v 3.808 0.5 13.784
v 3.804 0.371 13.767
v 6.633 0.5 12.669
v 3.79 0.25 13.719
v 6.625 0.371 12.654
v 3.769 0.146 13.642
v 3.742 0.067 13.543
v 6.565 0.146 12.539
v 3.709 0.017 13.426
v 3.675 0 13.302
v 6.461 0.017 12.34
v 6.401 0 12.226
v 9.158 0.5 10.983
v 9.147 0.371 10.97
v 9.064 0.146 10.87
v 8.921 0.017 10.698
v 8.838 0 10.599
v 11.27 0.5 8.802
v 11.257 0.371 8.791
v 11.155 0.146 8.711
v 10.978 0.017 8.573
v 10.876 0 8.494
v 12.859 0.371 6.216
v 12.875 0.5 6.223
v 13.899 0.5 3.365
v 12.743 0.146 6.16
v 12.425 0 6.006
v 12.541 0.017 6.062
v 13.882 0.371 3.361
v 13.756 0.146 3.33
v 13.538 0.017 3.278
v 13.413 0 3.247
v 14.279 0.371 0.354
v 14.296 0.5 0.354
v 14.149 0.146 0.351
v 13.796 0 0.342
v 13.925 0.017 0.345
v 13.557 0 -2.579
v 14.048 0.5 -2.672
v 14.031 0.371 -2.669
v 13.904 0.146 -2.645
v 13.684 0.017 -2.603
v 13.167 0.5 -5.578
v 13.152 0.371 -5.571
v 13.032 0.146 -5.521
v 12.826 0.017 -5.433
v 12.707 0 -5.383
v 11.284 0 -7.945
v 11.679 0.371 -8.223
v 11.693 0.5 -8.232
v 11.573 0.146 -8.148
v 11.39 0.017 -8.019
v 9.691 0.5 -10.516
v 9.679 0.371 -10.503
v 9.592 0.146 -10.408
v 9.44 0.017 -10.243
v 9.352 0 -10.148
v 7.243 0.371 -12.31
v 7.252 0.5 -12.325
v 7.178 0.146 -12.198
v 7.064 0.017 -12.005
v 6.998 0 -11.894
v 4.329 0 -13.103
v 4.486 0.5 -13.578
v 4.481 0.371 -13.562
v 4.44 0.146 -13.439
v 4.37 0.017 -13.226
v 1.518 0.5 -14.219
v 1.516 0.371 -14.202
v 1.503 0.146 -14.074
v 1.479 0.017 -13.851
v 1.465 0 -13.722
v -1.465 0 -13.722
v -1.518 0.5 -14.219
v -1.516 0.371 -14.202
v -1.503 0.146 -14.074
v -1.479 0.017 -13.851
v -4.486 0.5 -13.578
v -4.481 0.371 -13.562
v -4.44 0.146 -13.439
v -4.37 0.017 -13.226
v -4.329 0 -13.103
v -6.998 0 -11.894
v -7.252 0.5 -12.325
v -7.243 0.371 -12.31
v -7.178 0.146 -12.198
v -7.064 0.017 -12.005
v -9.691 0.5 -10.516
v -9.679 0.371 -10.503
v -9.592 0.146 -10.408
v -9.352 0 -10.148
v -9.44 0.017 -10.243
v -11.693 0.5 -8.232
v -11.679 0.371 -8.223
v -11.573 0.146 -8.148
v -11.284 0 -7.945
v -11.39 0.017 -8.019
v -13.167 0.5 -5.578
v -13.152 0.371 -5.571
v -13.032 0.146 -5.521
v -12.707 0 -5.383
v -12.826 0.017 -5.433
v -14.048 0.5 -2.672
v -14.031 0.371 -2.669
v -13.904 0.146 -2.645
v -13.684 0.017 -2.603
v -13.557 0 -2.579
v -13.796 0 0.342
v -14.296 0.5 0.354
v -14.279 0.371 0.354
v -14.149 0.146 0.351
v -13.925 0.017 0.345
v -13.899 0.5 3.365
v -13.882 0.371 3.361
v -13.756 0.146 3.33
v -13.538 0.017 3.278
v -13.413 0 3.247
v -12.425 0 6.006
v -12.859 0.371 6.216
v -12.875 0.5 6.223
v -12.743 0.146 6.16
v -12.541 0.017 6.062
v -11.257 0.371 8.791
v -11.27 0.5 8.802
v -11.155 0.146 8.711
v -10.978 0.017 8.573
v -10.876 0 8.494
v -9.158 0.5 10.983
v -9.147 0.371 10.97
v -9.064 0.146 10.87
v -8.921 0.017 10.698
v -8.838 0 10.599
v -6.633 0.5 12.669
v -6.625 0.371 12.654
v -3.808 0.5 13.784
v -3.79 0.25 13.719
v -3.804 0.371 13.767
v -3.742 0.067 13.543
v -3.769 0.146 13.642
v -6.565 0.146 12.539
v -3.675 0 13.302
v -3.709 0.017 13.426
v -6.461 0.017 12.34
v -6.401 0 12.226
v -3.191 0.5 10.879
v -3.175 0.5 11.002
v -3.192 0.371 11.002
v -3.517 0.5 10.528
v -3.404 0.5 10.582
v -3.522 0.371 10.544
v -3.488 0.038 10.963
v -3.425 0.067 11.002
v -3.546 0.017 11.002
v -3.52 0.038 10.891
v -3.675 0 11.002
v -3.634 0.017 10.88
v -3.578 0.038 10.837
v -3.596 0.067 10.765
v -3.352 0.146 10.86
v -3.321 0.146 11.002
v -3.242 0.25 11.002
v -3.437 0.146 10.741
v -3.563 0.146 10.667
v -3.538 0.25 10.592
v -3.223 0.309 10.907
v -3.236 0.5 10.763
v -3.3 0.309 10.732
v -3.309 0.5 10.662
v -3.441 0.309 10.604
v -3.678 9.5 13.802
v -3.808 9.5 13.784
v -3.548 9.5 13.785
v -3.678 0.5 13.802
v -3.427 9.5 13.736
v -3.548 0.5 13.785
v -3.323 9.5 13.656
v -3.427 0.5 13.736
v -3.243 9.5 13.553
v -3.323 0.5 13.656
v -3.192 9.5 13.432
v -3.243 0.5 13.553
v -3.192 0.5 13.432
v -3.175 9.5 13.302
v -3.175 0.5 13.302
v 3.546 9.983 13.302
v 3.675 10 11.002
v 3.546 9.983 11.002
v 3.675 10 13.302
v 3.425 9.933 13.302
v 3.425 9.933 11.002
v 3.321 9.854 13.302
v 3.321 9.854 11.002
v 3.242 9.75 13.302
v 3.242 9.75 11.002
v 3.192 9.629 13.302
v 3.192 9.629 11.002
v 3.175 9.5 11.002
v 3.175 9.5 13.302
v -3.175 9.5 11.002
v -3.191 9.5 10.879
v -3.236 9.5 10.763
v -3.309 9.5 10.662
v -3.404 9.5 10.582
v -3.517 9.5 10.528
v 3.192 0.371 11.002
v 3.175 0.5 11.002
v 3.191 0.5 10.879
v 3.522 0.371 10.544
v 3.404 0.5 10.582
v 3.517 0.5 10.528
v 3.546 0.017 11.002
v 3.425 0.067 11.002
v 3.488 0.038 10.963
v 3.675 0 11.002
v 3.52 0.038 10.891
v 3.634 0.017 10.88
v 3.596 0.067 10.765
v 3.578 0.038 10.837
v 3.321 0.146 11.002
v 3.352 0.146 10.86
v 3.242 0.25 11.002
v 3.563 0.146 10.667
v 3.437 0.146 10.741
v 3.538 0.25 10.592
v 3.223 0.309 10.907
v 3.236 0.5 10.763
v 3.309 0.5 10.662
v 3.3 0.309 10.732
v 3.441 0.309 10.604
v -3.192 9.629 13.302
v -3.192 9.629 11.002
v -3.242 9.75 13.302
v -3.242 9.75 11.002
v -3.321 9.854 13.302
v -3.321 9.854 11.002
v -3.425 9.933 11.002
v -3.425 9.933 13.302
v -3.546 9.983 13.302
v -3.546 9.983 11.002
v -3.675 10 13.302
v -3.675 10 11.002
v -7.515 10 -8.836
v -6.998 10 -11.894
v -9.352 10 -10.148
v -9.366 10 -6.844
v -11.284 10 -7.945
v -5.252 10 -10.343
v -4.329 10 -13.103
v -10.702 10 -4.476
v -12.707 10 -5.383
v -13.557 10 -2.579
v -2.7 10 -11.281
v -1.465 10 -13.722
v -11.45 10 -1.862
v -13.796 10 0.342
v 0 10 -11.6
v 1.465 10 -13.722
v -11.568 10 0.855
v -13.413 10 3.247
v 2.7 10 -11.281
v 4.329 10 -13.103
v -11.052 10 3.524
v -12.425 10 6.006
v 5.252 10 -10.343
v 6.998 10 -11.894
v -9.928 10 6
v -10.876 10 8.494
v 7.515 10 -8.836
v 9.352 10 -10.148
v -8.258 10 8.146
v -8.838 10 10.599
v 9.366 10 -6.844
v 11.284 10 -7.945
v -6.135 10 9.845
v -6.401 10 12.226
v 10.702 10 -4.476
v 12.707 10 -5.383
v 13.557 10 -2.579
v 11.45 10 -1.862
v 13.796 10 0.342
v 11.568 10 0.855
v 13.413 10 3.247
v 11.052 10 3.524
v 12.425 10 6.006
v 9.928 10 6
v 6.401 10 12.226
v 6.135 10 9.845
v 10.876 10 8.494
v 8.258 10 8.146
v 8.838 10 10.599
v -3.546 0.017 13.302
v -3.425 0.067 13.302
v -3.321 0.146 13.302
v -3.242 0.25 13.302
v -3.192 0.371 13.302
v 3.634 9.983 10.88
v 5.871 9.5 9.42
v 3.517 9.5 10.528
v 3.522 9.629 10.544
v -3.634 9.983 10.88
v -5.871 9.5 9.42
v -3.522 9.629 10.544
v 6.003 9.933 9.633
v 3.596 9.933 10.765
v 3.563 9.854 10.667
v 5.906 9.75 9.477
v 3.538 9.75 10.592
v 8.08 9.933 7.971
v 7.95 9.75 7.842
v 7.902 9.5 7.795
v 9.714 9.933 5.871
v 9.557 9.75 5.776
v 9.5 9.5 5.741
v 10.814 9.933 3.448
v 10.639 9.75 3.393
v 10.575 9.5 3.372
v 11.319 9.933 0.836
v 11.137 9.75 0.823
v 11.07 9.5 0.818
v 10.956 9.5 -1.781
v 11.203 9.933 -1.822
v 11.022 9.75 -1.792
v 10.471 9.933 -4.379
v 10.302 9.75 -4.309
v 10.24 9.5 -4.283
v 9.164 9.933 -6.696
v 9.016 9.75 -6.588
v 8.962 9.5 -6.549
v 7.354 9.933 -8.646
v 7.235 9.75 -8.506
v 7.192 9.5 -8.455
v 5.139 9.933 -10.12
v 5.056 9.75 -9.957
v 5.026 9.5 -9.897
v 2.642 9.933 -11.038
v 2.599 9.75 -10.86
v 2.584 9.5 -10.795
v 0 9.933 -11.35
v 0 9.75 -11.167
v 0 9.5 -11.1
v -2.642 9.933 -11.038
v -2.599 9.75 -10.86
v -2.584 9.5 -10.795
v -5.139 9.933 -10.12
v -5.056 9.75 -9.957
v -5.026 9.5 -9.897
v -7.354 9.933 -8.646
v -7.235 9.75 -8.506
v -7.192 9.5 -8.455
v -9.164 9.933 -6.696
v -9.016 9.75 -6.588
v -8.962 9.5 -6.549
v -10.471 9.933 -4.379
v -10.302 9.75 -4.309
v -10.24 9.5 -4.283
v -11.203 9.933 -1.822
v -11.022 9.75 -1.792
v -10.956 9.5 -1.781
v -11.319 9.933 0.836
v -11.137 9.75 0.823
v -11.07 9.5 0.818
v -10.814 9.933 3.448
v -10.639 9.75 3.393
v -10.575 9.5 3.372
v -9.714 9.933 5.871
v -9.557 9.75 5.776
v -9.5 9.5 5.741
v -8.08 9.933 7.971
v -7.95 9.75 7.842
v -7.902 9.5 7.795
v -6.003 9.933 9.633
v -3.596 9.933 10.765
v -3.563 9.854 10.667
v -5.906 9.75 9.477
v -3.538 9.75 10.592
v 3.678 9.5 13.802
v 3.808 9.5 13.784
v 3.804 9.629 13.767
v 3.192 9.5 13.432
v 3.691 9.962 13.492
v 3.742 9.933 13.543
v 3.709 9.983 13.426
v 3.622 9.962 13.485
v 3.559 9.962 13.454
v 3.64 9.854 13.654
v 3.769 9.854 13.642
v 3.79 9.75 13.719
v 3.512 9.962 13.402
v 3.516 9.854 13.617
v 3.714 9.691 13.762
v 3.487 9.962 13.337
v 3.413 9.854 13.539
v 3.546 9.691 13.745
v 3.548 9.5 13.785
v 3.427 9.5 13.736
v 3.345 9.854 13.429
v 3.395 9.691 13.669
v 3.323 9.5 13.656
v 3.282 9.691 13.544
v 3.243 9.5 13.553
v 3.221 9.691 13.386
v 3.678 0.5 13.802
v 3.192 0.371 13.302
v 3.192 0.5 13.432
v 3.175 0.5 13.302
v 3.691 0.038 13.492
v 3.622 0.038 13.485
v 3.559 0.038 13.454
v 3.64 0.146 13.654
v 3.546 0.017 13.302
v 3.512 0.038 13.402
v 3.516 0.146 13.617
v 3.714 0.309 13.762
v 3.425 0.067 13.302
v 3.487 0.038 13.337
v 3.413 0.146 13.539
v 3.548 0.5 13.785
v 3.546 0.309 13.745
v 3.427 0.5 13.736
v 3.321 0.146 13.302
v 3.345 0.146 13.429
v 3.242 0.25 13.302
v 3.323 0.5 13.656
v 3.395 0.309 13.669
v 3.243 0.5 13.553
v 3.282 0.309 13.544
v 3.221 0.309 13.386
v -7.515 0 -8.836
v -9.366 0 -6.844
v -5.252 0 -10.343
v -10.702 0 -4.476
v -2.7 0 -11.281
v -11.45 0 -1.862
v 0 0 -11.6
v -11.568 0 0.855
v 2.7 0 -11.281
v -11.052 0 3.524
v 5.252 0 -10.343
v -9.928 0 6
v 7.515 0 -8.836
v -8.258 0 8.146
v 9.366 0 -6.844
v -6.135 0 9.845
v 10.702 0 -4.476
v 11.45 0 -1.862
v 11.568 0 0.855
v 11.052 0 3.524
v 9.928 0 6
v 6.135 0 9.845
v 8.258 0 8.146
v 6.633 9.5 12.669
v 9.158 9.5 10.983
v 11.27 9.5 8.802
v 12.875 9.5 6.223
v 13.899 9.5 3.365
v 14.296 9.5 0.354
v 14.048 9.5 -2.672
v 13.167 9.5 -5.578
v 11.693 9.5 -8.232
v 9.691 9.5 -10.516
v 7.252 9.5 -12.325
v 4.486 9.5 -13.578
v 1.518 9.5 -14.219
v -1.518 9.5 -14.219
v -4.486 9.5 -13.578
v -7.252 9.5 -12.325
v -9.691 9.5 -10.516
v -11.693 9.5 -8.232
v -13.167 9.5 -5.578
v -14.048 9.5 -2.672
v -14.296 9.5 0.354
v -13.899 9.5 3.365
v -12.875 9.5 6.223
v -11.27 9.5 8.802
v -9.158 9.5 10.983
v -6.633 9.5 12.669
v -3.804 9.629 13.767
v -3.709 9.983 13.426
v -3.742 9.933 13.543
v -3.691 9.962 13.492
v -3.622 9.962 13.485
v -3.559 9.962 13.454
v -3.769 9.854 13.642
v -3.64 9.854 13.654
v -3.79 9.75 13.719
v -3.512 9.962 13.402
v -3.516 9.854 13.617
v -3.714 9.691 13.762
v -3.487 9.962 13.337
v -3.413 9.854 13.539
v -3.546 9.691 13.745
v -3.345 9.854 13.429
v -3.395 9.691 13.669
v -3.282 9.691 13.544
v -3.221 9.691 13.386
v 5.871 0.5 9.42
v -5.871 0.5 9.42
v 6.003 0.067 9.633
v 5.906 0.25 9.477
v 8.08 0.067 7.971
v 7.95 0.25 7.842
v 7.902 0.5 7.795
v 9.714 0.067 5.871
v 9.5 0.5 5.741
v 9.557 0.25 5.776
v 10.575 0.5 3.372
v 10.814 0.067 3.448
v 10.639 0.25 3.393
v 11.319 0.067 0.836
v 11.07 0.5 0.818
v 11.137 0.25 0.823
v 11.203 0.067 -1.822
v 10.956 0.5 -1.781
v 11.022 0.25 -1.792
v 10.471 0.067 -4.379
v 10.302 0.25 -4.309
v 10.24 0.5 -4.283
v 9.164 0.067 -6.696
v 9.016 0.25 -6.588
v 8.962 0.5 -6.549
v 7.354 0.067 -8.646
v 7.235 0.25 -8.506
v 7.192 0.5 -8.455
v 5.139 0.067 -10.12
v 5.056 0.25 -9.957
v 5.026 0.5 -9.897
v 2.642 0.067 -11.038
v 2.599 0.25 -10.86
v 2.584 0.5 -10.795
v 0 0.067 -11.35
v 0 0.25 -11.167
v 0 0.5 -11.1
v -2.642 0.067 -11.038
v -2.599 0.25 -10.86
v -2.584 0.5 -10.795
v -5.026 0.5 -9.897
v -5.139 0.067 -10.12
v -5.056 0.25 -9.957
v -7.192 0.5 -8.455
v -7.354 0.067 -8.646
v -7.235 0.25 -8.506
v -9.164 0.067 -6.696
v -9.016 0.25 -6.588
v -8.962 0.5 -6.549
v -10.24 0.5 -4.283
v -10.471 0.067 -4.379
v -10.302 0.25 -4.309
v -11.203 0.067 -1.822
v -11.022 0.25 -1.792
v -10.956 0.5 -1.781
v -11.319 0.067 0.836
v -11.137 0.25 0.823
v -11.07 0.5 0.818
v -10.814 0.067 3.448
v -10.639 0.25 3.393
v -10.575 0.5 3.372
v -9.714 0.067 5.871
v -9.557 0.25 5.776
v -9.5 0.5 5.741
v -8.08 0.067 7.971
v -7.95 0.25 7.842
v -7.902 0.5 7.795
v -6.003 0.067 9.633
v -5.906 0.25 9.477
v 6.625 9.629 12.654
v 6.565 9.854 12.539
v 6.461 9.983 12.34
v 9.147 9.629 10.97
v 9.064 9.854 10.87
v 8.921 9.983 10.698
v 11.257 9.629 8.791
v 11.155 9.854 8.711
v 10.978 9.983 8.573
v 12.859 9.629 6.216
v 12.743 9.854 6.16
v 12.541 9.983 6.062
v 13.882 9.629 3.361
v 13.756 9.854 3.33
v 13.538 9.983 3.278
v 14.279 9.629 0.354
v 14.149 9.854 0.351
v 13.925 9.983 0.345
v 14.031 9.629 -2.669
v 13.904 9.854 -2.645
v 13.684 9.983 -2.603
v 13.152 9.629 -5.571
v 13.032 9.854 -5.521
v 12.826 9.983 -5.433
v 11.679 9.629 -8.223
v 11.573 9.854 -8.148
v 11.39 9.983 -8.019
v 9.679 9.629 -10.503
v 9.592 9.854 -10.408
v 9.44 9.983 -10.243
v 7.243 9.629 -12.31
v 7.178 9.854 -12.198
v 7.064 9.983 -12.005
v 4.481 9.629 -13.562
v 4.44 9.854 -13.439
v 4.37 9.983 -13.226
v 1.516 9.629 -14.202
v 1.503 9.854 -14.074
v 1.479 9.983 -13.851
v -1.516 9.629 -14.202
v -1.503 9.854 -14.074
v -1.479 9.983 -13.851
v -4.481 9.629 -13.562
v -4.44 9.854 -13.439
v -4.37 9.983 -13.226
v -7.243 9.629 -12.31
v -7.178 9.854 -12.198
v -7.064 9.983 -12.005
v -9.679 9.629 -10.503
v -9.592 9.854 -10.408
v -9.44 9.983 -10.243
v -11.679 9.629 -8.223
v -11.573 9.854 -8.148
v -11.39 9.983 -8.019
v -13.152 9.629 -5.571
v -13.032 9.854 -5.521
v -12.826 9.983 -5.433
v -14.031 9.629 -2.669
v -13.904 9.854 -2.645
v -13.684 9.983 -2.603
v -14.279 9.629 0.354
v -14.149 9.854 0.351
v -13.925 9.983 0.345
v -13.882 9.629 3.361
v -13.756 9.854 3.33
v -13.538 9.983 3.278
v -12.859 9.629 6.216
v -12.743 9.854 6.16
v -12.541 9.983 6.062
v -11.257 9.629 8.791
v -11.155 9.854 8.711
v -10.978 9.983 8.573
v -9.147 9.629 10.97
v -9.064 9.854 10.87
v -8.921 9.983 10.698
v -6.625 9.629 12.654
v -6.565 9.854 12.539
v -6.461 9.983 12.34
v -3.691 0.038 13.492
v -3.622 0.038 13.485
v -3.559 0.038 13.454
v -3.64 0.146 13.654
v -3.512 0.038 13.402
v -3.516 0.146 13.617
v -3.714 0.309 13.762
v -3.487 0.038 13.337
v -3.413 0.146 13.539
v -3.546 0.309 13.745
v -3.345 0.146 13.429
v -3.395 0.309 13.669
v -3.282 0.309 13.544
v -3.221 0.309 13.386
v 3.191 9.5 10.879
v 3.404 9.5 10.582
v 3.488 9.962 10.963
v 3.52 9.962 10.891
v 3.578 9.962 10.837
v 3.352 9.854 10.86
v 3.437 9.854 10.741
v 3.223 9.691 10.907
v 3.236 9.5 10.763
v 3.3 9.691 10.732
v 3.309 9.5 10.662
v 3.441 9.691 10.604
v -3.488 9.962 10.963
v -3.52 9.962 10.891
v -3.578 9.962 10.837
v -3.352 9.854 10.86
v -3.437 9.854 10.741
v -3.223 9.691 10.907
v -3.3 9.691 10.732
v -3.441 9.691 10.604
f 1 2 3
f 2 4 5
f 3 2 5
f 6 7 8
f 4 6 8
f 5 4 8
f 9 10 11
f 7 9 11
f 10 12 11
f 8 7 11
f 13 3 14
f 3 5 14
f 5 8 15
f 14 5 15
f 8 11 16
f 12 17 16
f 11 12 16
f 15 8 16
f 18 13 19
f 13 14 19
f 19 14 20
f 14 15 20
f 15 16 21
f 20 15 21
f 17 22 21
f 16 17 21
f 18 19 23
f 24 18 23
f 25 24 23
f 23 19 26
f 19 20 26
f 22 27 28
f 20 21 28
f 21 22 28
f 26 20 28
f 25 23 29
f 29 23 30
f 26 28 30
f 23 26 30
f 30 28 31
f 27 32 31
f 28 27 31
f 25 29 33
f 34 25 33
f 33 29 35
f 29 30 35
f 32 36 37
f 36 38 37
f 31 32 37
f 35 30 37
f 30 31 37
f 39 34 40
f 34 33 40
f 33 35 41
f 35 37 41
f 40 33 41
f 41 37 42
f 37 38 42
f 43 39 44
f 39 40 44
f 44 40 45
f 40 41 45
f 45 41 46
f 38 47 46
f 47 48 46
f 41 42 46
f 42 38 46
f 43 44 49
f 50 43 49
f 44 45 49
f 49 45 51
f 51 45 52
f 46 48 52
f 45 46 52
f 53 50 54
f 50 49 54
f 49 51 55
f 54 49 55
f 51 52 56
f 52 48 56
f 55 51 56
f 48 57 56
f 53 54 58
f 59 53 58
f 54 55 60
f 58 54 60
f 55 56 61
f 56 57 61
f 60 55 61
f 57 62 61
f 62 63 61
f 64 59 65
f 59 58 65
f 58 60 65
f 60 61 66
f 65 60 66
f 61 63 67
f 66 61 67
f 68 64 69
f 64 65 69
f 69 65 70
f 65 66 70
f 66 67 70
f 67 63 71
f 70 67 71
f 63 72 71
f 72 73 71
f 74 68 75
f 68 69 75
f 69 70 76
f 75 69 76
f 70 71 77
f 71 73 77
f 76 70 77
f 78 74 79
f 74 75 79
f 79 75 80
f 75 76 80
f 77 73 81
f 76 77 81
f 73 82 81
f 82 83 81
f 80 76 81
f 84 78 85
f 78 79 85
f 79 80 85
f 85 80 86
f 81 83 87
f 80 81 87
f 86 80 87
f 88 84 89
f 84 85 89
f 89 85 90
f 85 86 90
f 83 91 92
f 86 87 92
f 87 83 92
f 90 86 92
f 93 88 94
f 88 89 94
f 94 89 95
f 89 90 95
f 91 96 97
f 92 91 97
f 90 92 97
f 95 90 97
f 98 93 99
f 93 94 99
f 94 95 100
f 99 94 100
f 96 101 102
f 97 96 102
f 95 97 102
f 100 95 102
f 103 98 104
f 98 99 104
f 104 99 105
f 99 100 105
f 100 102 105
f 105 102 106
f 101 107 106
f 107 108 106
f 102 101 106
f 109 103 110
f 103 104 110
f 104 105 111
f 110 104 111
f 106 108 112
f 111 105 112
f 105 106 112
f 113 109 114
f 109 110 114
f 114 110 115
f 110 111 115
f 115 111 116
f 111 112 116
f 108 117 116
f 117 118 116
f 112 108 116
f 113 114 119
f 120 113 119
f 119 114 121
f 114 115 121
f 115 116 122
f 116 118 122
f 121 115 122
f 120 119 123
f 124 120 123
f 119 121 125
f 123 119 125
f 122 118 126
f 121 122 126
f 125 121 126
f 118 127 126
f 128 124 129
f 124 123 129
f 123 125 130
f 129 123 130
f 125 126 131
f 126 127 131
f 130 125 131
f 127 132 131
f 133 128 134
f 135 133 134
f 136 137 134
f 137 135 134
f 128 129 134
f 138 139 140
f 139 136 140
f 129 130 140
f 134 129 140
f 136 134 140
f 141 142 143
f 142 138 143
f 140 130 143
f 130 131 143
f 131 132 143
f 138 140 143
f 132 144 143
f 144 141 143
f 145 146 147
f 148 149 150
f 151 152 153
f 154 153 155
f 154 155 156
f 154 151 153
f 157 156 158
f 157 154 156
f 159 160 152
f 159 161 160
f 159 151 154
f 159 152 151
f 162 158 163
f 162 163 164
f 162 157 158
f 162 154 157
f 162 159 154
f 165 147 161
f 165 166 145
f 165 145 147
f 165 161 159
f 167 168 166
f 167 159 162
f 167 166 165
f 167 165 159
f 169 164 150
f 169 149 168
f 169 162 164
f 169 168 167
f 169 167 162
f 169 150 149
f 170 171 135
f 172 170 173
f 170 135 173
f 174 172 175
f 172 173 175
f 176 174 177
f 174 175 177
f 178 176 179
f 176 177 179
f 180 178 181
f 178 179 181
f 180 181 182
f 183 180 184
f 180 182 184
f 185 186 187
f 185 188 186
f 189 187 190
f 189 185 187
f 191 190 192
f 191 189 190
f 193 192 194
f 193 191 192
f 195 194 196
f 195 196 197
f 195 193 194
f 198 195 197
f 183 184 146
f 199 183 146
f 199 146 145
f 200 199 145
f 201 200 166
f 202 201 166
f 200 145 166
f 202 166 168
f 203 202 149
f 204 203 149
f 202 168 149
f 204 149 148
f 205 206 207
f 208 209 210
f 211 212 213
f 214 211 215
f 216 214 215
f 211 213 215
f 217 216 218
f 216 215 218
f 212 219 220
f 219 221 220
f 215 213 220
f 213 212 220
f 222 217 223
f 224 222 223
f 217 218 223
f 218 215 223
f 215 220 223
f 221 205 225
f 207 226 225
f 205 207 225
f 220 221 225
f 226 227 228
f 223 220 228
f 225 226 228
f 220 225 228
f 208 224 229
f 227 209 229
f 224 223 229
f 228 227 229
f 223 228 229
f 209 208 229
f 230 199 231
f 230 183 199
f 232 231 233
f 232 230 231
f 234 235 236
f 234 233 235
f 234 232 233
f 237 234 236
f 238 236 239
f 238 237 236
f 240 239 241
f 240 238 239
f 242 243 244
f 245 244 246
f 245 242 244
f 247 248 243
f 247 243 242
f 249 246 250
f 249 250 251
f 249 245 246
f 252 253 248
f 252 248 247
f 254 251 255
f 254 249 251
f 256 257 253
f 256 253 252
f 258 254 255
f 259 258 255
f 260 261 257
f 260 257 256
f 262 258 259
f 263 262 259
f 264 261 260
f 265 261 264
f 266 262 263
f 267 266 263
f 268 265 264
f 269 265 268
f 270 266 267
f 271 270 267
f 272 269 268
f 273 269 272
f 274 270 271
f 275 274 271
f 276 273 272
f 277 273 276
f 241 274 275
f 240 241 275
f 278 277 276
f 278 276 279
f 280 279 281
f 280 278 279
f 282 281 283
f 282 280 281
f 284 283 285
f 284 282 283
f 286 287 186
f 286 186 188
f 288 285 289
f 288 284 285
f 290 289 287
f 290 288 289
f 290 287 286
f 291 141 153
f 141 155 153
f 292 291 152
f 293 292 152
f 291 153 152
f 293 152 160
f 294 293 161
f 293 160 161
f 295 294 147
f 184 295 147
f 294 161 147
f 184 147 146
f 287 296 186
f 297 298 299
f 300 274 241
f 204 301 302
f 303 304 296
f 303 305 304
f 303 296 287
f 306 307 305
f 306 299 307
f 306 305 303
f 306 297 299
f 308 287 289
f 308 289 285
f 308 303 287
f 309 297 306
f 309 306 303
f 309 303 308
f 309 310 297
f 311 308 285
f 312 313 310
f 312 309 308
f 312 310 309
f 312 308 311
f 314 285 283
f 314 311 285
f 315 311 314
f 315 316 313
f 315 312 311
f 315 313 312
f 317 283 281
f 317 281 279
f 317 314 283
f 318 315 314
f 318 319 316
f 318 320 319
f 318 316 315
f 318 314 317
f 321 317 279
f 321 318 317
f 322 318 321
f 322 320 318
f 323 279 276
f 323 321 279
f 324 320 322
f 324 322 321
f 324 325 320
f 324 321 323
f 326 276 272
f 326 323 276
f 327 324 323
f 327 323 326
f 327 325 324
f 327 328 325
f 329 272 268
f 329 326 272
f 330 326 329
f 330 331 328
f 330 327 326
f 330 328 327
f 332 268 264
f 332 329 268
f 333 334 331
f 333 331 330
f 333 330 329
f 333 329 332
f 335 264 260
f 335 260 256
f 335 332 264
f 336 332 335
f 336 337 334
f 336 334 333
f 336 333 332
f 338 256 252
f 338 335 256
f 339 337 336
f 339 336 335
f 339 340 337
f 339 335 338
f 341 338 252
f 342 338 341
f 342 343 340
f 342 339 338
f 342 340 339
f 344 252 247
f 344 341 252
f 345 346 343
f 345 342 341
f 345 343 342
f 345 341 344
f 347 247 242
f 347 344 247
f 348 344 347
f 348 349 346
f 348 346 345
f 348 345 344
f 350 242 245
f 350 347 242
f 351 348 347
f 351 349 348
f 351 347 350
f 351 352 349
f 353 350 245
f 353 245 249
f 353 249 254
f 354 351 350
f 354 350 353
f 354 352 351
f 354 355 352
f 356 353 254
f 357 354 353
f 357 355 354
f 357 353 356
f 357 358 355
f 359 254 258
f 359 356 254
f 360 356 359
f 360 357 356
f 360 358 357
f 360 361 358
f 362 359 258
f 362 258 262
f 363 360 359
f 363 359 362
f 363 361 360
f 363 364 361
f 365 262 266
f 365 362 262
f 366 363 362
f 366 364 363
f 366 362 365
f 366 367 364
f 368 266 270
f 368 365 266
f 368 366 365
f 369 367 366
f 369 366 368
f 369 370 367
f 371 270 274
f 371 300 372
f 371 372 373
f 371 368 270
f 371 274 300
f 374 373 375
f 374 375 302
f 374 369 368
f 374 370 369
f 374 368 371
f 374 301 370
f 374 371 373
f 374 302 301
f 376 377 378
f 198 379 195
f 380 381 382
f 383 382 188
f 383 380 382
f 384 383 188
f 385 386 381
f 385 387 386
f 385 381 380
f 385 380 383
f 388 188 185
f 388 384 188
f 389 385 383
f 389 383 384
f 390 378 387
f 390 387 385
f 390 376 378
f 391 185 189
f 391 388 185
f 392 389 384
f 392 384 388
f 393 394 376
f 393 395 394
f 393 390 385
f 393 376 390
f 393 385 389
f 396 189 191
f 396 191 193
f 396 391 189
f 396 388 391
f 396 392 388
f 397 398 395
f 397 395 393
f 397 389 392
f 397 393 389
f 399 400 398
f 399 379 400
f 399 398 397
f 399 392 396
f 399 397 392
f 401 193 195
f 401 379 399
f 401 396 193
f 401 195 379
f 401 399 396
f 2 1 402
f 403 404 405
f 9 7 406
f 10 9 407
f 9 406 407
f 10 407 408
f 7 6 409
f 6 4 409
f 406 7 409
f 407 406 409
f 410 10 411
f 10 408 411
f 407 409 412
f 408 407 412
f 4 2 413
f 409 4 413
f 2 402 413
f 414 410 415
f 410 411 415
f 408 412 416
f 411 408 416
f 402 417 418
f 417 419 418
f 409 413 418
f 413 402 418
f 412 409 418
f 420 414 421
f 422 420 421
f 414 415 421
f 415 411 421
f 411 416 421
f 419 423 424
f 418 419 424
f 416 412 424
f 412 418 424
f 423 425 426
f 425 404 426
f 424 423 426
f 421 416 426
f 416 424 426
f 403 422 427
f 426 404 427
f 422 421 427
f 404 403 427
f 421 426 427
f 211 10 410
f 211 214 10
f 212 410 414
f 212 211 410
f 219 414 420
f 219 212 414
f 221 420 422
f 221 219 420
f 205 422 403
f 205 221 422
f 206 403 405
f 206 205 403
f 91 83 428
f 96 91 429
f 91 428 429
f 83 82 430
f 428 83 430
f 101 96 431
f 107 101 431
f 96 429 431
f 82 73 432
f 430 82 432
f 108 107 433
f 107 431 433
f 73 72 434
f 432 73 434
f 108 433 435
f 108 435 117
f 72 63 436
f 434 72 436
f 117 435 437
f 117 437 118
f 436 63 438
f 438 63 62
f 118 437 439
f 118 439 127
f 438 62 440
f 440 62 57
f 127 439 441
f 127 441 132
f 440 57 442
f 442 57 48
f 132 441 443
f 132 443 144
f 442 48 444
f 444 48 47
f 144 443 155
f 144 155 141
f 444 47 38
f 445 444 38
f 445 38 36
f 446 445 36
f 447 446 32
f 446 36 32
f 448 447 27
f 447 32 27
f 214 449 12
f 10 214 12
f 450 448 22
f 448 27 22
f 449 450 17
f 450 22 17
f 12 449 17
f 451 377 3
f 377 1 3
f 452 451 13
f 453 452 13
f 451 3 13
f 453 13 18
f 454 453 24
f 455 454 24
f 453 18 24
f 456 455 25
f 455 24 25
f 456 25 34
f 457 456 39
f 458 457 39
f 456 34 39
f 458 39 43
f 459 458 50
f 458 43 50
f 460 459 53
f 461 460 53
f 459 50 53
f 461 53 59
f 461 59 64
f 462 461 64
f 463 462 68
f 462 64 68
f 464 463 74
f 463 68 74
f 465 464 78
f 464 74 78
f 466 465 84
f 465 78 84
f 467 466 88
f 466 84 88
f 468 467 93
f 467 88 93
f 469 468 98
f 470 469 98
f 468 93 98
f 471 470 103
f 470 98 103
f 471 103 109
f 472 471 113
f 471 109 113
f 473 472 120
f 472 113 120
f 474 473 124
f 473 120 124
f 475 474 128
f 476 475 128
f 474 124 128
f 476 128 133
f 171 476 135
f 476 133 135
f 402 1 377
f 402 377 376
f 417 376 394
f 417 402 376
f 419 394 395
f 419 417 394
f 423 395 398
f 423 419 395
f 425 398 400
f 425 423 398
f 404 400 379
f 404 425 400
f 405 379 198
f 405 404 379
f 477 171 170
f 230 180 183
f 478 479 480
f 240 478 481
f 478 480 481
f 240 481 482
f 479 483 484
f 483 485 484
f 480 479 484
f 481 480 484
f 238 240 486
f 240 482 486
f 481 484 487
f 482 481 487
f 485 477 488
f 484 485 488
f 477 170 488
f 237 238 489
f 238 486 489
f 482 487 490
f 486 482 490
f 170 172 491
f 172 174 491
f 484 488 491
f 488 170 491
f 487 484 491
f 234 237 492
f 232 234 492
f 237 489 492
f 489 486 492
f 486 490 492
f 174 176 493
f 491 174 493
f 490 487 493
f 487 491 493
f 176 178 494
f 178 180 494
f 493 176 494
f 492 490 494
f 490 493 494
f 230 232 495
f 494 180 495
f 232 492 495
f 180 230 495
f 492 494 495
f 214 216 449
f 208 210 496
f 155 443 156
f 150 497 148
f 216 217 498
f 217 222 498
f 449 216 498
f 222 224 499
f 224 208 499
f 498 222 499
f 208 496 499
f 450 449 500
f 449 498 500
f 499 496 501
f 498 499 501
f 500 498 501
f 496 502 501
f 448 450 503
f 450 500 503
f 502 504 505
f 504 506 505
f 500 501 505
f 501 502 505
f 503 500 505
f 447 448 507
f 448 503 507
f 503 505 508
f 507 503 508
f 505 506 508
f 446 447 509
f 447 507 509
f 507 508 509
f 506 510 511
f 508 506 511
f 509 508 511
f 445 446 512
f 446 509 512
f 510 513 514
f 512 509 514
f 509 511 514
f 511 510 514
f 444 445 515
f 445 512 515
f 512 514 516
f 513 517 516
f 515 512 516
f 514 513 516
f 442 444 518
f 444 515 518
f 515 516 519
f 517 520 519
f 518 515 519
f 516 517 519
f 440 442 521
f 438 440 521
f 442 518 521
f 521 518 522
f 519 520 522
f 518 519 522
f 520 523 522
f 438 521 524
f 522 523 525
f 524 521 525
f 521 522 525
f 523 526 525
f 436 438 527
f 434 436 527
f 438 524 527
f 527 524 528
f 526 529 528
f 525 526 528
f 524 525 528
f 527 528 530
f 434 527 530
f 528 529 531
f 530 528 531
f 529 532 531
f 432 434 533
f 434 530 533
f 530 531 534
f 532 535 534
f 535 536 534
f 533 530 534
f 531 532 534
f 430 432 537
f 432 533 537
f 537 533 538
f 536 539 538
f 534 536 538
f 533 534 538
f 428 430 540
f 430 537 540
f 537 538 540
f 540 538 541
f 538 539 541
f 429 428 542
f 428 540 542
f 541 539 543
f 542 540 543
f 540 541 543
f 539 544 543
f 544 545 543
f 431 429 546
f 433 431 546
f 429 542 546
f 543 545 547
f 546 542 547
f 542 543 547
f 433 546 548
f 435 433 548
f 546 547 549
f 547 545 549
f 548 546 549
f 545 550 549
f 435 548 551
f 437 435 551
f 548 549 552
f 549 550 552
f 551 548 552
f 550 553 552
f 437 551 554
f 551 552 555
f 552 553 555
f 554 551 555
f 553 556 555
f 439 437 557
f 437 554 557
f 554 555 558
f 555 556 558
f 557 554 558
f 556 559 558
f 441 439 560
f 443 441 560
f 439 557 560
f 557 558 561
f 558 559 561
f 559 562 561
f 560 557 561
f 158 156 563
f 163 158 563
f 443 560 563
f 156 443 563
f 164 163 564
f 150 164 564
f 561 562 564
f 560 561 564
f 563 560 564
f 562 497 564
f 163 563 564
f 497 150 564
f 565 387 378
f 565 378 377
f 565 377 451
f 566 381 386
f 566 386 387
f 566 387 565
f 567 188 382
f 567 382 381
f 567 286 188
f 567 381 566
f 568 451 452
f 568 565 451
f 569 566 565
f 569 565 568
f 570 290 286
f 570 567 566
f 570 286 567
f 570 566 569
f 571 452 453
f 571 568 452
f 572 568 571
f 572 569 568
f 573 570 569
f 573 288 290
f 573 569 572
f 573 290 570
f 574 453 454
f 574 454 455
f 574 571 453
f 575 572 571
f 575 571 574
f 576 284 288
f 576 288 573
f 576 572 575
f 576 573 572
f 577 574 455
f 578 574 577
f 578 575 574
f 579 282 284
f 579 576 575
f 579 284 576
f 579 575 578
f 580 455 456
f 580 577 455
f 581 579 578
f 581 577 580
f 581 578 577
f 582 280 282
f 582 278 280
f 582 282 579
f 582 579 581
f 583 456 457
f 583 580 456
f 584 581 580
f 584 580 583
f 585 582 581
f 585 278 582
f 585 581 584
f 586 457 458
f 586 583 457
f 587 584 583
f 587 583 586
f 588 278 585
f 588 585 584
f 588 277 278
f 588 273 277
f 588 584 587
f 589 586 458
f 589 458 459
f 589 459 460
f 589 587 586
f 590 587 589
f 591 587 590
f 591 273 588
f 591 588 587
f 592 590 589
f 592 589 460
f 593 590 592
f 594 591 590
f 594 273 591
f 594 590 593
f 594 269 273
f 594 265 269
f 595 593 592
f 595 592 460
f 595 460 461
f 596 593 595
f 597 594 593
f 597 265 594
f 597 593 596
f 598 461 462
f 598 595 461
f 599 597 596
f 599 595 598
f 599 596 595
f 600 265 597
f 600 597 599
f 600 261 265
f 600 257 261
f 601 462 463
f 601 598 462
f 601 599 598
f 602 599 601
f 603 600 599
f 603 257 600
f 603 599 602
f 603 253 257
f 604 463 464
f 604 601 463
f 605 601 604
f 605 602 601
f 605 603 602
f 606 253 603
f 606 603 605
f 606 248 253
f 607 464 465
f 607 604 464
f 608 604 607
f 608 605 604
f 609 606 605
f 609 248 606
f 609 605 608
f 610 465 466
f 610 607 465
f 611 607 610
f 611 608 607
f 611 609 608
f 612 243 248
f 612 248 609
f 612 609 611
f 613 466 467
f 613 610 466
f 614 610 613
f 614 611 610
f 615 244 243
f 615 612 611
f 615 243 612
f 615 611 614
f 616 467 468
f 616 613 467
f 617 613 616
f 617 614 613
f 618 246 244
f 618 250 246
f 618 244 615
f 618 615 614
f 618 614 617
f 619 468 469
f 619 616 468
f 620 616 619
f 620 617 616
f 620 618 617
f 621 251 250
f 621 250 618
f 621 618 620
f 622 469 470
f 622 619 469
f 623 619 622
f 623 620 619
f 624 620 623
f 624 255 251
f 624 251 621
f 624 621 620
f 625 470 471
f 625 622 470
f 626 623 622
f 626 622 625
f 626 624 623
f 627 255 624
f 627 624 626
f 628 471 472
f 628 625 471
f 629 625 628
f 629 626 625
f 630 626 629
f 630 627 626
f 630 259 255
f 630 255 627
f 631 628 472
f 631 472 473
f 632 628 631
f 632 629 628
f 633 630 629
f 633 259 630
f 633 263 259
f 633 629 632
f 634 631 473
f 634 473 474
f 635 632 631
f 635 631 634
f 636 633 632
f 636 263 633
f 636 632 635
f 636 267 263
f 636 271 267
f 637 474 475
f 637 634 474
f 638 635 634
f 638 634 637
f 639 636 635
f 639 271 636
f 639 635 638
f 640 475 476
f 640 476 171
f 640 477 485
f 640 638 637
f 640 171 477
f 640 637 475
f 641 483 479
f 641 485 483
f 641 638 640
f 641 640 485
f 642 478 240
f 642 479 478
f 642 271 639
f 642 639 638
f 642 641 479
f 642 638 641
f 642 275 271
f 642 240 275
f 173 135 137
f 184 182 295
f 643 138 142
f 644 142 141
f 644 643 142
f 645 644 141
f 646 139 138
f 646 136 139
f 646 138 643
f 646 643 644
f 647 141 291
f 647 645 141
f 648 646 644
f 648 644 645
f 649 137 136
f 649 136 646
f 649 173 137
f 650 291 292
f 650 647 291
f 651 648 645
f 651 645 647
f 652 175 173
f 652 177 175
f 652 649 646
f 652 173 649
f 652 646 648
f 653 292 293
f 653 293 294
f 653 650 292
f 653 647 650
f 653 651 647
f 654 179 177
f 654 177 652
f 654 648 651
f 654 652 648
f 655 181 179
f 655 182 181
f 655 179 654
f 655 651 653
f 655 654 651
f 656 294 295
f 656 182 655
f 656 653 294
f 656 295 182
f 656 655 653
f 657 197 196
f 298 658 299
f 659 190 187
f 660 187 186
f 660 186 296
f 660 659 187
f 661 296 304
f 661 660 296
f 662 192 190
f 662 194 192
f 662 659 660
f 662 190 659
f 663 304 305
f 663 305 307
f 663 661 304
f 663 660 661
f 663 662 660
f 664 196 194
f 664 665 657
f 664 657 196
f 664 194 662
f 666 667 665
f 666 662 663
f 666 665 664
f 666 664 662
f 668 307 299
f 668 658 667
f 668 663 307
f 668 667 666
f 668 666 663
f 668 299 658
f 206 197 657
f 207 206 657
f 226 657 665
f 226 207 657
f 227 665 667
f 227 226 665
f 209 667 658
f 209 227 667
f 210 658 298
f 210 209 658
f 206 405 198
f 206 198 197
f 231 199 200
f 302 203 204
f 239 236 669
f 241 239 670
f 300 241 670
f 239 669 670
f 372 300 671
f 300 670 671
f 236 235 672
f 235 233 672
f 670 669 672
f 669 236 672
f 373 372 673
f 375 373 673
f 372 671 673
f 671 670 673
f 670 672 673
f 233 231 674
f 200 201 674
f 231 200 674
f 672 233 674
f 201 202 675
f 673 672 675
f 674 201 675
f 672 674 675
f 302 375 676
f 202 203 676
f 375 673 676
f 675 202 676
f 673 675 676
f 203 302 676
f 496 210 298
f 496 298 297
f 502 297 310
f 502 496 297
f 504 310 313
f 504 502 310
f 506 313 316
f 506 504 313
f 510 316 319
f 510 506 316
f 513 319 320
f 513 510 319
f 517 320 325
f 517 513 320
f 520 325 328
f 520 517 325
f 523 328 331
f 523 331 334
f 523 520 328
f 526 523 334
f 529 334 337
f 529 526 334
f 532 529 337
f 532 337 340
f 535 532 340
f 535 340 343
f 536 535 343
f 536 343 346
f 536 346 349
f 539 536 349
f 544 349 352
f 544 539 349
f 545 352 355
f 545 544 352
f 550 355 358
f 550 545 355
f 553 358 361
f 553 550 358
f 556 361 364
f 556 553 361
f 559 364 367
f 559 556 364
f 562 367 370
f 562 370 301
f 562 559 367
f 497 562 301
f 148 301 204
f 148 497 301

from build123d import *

# Parameters (mm, degrees)
SKETCH1_R           = 14.3
SKETCH1_R_2         = 11.1
BOSS_EXTRUDE1_DEPTH = 10
SKETCH2_W           = 6.35
SKETCH2_H           = 14.3
CUT_EXTRUDE1_DEPTH  = 23.560585099
FILLET1_R           = 0.5


with BuildPart() as part:
    # Sketch1 → Boss-Extrude1 (new body)
    with BuildSketch(Plane(origin=(0, 0, 0), x_dir=(1, 0, 0), z_dir=(0, 1, 0))):
        Circle(SKETCH1_R)
        Circle(SKETCH1_R_2, mode=Mode.SUBTRACT)
    extrude(amount=BOSS_EXTRUDE1_DEPTH)

    # Sketch2 → Cut-Extrude1 (cut, through all)
    with BuildSketch(Plane(origin=(0, 0, 0), x_dir=(1, 0, 0), z_dir=(0, 1, 0))):
        with Locations((0, -7.15)):
            Rectangle(SKETCH2_W, SKETCH2_H)
    extrude(amount=CUT_EXTRUDE1_DEPTH, mode=Mode.SUBTRACT)

    # Fillet1
    fillet1_edges = [part.edges().sort_by_distance(p)[0] for p in [
        (0, 0, -11.1),
        (3.175, 0, 12.289652799),
        (0, 0, -14.3),
        (-3.175, 0, 12.289652799),
        (3.175, 10, 12.289652799),
        (0, 10, -11.1),
        (-3.175, 10, 12.289652799),
        (0, 10, -14.3),
        (3.175, 5, 10.63622936),
        (3.175, 5, 13.943076239),
        (-3.175, 5, 10.63622936),
        (-3.175, 5, 13.943076239),
    ]]
    fillet(fillet1_edges, radius=FILLET1_R)


solid = part.part
